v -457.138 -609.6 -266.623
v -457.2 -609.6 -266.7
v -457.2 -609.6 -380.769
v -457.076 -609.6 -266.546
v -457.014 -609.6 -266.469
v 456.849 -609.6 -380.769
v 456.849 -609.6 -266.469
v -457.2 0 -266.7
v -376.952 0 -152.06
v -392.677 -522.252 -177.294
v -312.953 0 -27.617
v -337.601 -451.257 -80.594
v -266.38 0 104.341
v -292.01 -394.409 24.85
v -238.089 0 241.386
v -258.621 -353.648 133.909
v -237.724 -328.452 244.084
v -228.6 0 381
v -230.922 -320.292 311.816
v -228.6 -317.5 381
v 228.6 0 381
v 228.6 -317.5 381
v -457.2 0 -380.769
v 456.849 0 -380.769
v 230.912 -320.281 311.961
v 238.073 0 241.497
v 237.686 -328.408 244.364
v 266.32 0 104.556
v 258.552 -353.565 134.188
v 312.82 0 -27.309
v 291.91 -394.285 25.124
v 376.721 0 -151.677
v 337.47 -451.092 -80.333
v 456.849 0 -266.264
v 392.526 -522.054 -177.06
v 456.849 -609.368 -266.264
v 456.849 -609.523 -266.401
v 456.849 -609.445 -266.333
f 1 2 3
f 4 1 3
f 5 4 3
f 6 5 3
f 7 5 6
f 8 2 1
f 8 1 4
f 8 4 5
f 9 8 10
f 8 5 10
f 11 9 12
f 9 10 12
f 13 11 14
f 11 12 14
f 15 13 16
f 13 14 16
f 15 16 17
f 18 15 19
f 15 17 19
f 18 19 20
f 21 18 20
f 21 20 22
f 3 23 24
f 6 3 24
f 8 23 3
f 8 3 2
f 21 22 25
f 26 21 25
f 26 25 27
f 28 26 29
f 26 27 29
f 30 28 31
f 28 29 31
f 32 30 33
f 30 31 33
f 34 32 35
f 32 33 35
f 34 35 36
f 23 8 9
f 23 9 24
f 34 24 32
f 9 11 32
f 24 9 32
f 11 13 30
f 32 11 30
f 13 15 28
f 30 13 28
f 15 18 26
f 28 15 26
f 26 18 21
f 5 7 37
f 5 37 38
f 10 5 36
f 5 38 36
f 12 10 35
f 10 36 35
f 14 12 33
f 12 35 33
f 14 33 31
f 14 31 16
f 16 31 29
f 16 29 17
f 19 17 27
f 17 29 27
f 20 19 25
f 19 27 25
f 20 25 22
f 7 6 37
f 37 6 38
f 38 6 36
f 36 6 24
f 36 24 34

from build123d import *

# Parameters (mm, degrees)
F0_W     = 914.4
F0_H     = 762
F1_DEPTH = 609.6
F3_W     = 914.4
F3_H     = 762
F4_DEPTH = 609.6
F6_DEPTH = 2057.04989884
F8_DEPTH = 609.601


with BuildPart() as f1:
    # F0 (on Front) → F1 (new body)
    with BuildSketch(Plane.XZ):
        with Locations((-0.35110116, 123.4715153943)):
            Rectangle(F0_W, F0_H)
    extrude(amount=F1_DEPTH)


with BuildPart() as f1_1:
    # F2: moved
    add(f1.part.moved(Location((1143, 0, 0))))

    # F5 (on face) → F6 (cut, through all)
    with BuildSketch(Plane.YZ.offset(1599.84889884)):
        with BuildLine():
            Line((-609.6, 504.4715153943), (-609.6, -143.2284846057))
            ThreePointArc((-609.6, -143.2284846057), (-393.902496237, 149.2118568345), (-317.5, 504.4715153943))
            Line((-317.5, 504.4715153943), (-609.6, 504.4715153943))
        make_face()
    extrude(amount=-F6_DEPTH, mode=Mode.SUBTRACT)


with BuildPart() as f4:
    # F3 (on Front) → F4 (new body)
    with BuildSketch(Plane.XZ):
        Rectangle(F3_W, F3_H)
    extrude(amount=F4_DEPTH)

    # F7 (on face) → F8 (cut, through all)
    with BuildSketch(Plane.XZ.offset(609.6)):
        with BuildLine():
            Line((-457.2, 381), (-457.2, -266.7))
            ThreePointArc((-457.2, -266.7), (-287.4268495342, 37.5712410121), (-228.6, 381))
            Line((-228.6, 381), (-457.2, 381))
        make_face()
        with BuildLine():
            Line((457.2, 381), (228.6, 381))
            ThreePointArc((228.6, 381), (287.4268495342, 37.5712410121), (457.2, -266.7))
            Line((457.2, -266.7), (457.2, 381))
        make_face()
    extrude(amount=-F8_DEPTH, mode=Mode.SUBTRACT)


with BuildPart() as f1_2:
    # F9: moved
    add(f1_1.part.moved(Location((-1143, 0, -123.2408))))

    # F10: intersect F4
    add(f4.part, mode=Mode.INTERSECT)


solid = f1_2.part
